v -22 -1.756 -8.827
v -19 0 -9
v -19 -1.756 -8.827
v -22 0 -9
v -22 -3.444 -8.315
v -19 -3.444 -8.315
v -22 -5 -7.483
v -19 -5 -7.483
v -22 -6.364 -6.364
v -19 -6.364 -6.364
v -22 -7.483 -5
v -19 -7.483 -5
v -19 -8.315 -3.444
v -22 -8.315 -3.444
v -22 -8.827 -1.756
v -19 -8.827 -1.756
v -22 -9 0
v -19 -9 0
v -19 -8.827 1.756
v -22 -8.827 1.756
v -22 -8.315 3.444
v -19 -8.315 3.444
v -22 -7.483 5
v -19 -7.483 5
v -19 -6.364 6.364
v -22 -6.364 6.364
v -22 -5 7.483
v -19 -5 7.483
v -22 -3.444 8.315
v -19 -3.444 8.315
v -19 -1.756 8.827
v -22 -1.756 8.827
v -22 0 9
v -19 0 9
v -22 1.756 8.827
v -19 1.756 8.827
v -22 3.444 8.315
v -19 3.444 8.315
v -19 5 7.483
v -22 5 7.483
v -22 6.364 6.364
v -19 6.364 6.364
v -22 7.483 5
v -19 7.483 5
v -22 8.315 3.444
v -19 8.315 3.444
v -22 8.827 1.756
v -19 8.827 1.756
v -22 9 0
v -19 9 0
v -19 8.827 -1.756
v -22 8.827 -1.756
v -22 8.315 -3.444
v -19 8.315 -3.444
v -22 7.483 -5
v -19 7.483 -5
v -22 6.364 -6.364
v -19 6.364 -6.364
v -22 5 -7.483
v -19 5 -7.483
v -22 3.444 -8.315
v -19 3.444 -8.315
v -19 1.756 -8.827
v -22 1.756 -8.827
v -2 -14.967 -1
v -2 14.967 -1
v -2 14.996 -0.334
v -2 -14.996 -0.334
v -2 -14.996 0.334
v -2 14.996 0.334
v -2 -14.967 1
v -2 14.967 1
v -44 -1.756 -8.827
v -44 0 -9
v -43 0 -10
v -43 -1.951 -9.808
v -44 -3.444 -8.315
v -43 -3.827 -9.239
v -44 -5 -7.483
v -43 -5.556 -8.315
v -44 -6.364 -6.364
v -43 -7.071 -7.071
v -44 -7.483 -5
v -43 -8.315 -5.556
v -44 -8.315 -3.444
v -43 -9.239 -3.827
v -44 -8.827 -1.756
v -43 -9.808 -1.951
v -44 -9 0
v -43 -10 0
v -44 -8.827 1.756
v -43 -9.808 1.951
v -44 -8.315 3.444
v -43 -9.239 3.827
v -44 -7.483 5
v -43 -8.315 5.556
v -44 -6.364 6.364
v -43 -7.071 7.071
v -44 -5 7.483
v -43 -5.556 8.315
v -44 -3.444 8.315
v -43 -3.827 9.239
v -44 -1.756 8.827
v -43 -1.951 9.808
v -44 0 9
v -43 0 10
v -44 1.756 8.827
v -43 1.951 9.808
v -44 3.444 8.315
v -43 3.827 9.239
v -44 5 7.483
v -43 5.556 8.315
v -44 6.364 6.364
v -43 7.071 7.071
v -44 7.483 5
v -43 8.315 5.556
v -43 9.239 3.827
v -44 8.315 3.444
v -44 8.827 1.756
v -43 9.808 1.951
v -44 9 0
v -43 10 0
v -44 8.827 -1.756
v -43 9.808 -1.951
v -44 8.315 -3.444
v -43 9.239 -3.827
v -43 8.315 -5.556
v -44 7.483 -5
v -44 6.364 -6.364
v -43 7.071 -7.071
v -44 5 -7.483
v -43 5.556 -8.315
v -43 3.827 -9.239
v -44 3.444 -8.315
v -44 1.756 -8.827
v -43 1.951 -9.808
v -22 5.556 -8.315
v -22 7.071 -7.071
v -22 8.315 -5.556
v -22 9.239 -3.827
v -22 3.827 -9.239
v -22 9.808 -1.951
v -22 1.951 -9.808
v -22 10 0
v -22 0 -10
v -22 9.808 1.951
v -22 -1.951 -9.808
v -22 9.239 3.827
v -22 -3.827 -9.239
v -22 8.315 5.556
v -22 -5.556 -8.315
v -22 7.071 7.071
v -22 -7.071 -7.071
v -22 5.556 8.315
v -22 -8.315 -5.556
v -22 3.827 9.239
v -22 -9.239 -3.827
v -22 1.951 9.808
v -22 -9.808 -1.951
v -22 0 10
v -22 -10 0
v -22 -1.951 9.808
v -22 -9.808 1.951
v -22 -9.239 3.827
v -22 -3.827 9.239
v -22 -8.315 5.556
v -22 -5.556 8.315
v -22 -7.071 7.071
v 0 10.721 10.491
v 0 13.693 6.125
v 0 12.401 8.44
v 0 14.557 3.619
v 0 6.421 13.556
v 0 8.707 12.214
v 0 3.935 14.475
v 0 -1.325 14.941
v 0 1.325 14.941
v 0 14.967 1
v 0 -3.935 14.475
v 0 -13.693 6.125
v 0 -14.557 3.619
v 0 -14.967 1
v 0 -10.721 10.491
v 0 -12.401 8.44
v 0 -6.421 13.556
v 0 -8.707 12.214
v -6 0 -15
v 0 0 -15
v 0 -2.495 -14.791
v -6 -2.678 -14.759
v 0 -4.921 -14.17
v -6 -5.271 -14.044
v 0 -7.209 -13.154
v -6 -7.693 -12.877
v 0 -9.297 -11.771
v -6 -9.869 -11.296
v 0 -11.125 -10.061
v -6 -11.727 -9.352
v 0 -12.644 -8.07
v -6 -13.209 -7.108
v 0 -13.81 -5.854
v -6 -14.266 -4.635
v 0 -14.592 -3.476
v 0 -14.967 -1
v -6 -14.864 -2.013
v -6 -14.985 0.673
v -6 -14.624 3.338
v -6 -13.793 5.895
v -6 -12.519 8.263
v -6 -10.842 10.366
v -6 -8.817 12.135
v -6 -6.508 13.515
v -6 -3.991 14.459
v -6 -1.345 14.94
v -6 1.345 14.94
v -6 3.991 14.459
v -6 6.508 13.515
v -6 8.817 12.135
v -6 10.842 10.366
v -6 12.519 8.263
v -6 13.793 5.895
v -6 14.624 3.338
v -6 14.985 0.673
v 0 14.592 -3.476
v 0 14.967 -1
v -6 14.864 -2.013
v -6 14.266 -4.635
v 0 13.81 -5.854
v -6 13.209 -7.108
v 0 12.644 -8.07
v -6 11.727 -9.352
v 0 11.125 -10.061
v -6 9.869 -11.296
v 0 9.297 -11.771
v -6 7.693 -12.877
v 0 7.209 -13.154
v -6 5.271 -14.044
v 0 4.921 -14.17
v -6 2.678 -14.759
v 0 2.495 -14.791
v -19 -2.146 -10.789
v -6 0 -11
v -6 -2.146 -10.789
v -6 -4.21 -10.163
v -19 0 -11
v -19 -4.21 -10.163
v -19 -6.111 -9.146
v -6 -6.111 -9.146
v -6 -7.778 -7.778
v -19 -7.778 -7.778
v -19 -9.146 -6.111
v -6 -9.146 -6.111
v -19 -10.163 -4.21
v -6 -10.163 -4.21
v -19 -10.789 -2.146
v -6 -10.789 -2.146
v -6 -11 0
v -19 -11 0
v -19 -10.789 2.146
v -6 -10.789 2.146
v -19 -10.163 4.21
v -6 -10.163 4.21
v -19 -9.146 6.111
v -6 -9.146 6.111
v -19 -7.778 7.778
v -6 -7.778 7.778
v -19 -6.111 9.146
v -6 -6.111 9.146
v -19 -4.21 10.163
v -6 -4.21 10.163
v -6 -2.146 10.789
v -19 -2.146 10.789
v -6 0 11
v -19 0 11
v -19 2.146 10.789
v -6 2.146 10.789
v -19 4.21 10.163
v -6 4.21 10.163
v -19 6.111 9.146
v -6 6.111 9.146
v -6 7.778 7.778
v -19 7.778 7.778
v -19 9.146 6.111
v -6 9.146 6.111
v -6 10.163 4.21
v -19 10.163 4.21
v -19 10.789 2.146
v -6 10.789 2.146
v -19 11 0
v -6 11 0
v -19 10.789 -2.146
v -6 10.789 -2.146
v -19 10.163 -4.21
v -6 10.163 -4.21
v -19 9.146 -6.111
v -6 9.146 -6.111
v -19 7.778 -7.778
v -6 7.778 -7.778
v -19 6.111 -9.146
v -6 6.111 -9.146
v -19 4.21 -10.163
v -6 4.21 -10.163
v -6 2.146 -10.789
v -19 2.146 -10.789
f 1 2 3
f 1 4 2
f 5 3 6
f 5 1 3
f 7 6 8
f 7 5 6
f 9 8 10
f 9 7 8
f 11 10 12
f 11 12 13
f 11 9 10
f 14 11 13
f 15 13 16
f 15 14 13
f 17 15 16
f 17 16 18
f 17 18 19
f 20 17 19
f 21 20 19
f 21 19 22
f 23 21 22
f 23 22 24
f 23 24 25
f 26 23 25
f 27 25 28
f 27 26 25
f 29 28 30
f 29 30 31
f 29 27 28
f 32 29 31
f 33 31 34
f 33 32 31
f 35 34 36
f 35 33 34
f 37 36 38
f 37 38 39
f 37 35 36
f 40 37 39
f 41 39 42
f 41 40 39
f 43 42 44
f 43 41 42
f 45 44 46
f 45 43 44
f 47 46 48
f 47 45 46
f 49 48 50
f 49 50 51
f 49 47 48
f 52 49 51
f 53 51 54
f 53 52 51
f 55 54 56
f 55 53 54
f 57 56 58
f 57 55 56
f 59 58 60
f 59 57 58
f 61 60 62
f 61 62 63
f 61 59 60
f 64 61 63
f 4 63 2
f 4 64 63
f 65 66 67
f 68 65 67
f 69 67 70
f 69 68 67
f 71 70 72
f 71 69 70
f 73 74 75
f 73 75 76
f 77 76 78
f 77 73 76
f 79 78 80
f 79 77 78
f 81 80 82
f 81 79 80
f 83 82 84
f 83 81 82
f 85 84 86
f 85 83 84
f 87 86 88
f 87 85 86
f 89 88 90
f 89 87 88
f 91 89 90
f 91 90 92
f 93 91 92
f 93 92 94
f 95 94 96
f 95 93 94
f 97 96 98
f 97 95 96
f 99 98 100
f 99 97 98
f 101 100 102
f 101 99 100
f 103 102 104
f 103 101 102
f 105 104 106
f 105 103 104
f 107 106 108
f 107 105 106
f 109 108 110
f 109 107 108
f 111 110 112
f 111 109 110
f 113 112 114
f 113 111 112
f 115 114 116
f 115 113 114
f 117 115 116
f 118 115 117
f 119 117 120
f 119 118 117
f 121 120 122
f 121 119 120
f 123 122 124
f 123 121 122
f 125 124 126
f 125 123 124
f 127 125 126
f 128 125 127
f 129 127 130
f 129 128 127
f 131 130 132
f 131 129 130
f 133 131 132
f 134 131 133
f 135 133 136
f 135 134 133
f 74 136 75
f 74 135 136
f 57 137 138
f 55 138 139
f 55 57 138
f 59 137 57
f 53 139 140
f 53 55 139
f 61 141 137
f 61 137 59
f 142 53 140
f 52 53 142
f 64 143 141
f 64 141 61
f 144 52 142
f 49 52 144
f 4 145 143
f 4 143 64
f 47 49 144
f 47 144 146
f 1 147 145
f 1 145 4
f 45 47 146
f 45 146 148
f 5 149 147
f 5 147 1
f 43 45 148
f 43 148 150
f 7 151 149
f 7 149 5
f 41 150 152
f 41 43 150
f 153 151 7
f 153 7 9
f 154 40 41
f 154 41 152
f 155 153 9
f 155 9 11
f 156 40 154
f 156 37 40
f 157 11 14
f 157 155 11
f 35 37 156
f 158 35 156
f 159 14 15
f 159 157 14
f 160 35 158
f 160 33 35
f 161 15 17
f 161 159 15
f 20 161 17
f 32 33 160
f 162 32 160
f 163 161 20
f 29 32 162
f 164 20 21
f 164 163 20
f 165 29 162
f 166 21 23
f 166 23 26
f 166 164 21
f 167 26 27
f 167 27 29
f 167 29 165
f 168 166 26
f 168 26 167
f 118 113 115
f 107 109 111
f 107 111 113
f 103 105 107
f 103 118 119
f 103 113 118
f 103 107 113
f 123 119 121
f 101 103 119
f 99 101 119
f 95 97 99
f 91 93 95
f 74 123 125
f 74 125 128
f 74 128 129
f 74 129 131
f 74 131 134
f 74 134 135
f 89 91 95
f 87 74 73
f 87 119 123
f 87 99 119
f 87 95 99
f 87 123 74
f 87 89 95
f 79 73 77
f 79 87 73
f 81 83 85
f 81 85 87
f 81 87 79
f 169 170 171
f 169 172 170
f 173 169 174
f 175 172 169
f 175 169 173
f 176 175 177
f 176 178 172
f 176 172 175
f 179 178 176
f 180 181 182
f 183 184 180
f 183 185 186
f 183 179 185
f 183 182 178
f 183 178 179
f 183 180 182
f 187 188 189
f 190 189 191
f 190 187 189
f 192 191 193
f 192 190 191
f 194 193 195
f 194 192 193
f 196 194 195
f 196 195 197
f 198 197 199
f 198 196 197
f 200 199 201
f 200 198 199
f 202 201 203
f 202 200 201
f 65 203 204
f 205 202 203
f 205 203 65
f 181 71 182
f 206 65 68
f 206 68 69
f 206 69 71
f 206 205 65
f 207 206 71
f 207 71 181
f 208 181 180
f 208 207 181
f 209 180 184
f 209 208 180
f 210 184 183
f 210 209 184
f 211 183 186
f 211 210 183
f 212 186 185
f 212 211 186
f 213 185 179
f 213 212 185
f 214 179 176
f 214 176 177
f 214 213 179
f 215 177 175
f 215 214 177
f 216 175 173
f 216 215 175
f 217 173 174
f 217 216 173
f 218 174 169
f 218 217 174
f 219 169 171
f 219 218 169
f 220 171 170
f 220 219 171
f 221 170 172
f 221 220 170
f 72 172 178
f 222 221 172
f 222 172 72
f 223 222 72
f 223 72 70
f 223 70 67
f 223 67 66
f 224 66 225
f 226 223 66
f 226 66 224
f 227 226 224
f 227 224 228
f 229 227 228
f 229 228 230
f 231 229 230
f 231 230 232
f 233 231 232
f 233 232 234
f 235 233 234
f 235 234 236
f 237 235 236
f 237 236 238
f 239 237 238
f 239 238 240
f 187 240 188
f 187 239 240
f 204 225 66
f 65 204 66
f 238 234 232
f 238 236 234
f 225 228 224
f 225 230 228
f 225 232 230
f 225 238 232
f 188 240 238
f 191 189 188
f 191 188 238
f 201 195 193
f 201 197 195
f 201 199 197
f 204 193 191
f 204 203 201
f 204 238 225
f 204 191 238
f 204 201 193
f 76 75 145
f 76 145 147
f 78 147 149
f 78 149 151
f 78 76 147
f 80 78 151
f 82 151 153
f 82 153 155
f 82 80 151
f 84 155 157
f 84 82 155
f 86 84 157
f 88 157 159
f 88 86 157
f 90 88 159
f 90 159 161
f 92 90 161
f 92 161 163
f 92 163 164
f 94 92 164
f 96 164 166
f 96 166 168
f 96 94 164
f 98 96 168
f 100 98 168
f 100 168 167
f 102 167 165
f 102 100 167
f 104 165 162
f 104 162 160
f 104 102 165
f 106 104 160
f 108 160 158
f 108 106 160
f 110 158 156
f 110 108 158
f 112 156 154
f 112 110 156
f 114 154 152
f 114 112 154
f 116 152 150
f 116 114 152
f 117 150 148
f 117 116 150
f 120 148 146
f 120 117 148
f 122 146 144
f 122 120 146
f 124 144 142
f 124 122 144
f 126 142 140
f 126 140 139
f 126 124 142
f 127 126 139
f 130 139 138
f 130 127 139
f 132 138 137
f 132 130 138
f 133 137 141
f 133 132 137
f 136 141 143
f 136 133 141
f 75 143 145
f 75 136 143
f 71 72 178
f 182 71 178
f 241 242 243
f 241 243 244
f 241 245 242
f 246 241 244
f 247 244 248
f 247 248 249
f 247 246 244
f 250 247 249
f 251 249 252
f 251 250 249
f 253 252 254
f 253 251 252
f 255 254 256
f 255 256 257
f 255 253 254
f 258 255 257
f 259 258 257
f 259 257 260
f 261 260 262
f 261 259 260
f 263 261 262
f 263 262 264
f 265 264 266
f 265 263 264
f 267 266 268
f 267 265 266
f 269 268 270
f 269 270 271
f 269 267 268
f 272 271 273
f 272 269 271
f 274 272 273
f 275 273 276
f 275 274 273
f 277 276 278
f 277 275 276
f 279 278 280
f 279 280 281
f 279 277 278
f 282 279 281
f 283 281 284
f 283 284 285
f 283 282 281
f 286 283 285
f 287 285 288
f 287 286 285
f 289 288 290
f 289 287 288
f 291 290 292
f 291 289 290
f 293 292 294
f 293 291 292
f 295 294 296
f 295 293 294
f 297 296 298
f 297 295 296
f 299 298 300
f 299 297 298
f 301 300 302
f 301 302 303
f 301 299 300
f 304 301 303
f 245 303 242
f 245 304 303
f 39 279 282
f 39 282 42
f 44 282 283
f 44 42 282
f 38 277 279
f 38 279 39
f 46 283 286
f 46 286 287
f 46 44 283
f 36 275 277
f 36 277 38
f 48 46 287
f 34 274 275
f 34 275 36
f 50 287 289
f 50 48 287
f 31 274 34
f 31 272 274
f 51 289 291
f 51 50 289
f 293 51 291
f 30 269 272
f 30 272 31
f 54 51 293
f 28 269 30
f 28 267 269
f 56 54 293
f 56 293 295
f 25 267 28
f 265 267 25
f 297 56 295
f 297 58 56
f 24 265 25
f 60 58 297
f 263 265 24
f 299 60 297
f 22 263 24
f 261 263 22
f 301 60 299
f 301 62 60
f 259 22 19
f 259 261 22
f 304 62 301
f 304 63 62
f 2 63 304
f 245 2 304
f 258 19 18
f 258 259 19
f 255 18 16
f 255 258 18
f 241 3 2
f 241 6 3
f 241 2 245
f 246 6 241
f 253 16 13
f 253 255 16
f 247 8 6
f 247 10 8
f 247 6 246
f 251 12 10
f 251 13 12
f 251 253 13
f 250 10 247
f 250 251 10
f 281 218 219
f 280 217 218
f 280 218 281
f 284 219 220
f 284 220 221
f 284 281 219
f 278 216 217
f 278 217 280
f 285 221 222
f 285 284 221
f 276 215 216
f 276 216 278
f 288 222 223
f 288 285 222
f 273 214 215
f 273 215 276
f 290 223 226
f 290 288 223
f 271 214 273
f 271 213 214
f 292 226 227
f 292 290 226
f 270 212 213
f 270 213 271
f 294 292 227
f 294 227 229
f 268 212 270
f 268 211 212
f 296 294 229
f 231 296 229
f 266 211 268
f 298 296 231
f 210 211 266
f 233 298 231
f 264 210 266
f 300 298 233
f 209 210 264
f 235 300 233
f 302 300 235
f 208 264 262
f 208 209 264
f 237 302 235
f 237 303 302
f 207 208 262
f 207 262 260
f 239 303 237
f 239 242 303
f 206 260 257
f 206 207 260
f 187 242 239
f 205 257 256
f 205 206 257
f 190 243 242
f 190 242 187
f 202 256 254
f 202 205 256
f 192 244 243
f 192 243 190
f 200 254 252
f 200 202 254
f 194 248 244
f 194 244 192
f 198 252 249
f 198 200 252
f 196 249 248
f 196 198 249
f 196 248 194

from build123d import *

# Parameters (mm, degrees)
KES_EKSTR_ZYON1_DEPTH      = 49.846698967
KES_EKSTR_ZYON1_DEPTH_BACK = 49.846698967
PAH1_SIZE                  = 1


with BuildPart() as part:
    # Çizim1 → Döndür1 (revolve)
    with BuildSketch(Plane.XY, mode=Mode.PRIVATE) as d_nd_r1_sk:
        Polygon((0, 0), (0, 15), (-6, 15), (-6, 11), (-19, 11), (-19, 9), (-22, 9), (-22, 10), (-44, 10), (-44, 0), align=None)
    revolve(d_nd_r1_sk.sketch.rotate(Axis((0, 0, 0), (-1, 0, 0)), 90), axis=Axis((0, 0, 0), (-1, 0, 0)))

    # Çizim2 → Kes-Ekstrüzyon1 (cut, two sides: drawn at the far end of the back side and taken through both)
    with BuildSketch(Plane(origin=(0, 0, 0), x_dir=(1, 0, 0), z_dir=(0, 1, 0)).offset(-KES_EKSTR_ZYON1_DEPTH_BACK)):
        Polygon((0, 0), (0, 1), (-2, 1), (-2, -1), (0, -1), align=None)
    extrude(amount=KES_EKSTR_ZYON1_DEPTH + KES_EKSTR_ZYON1_DEPTH_BACK, mode=Mode.SUBTRACT)

    # Pah1
    pah1_edges = [part.edges().sort_by_distance(p)[0] for p in [
        (-44, 0, 10),
    ]]
    chamfer(pah1_edges, length=PAH1_SIZE)


solid = part.part
